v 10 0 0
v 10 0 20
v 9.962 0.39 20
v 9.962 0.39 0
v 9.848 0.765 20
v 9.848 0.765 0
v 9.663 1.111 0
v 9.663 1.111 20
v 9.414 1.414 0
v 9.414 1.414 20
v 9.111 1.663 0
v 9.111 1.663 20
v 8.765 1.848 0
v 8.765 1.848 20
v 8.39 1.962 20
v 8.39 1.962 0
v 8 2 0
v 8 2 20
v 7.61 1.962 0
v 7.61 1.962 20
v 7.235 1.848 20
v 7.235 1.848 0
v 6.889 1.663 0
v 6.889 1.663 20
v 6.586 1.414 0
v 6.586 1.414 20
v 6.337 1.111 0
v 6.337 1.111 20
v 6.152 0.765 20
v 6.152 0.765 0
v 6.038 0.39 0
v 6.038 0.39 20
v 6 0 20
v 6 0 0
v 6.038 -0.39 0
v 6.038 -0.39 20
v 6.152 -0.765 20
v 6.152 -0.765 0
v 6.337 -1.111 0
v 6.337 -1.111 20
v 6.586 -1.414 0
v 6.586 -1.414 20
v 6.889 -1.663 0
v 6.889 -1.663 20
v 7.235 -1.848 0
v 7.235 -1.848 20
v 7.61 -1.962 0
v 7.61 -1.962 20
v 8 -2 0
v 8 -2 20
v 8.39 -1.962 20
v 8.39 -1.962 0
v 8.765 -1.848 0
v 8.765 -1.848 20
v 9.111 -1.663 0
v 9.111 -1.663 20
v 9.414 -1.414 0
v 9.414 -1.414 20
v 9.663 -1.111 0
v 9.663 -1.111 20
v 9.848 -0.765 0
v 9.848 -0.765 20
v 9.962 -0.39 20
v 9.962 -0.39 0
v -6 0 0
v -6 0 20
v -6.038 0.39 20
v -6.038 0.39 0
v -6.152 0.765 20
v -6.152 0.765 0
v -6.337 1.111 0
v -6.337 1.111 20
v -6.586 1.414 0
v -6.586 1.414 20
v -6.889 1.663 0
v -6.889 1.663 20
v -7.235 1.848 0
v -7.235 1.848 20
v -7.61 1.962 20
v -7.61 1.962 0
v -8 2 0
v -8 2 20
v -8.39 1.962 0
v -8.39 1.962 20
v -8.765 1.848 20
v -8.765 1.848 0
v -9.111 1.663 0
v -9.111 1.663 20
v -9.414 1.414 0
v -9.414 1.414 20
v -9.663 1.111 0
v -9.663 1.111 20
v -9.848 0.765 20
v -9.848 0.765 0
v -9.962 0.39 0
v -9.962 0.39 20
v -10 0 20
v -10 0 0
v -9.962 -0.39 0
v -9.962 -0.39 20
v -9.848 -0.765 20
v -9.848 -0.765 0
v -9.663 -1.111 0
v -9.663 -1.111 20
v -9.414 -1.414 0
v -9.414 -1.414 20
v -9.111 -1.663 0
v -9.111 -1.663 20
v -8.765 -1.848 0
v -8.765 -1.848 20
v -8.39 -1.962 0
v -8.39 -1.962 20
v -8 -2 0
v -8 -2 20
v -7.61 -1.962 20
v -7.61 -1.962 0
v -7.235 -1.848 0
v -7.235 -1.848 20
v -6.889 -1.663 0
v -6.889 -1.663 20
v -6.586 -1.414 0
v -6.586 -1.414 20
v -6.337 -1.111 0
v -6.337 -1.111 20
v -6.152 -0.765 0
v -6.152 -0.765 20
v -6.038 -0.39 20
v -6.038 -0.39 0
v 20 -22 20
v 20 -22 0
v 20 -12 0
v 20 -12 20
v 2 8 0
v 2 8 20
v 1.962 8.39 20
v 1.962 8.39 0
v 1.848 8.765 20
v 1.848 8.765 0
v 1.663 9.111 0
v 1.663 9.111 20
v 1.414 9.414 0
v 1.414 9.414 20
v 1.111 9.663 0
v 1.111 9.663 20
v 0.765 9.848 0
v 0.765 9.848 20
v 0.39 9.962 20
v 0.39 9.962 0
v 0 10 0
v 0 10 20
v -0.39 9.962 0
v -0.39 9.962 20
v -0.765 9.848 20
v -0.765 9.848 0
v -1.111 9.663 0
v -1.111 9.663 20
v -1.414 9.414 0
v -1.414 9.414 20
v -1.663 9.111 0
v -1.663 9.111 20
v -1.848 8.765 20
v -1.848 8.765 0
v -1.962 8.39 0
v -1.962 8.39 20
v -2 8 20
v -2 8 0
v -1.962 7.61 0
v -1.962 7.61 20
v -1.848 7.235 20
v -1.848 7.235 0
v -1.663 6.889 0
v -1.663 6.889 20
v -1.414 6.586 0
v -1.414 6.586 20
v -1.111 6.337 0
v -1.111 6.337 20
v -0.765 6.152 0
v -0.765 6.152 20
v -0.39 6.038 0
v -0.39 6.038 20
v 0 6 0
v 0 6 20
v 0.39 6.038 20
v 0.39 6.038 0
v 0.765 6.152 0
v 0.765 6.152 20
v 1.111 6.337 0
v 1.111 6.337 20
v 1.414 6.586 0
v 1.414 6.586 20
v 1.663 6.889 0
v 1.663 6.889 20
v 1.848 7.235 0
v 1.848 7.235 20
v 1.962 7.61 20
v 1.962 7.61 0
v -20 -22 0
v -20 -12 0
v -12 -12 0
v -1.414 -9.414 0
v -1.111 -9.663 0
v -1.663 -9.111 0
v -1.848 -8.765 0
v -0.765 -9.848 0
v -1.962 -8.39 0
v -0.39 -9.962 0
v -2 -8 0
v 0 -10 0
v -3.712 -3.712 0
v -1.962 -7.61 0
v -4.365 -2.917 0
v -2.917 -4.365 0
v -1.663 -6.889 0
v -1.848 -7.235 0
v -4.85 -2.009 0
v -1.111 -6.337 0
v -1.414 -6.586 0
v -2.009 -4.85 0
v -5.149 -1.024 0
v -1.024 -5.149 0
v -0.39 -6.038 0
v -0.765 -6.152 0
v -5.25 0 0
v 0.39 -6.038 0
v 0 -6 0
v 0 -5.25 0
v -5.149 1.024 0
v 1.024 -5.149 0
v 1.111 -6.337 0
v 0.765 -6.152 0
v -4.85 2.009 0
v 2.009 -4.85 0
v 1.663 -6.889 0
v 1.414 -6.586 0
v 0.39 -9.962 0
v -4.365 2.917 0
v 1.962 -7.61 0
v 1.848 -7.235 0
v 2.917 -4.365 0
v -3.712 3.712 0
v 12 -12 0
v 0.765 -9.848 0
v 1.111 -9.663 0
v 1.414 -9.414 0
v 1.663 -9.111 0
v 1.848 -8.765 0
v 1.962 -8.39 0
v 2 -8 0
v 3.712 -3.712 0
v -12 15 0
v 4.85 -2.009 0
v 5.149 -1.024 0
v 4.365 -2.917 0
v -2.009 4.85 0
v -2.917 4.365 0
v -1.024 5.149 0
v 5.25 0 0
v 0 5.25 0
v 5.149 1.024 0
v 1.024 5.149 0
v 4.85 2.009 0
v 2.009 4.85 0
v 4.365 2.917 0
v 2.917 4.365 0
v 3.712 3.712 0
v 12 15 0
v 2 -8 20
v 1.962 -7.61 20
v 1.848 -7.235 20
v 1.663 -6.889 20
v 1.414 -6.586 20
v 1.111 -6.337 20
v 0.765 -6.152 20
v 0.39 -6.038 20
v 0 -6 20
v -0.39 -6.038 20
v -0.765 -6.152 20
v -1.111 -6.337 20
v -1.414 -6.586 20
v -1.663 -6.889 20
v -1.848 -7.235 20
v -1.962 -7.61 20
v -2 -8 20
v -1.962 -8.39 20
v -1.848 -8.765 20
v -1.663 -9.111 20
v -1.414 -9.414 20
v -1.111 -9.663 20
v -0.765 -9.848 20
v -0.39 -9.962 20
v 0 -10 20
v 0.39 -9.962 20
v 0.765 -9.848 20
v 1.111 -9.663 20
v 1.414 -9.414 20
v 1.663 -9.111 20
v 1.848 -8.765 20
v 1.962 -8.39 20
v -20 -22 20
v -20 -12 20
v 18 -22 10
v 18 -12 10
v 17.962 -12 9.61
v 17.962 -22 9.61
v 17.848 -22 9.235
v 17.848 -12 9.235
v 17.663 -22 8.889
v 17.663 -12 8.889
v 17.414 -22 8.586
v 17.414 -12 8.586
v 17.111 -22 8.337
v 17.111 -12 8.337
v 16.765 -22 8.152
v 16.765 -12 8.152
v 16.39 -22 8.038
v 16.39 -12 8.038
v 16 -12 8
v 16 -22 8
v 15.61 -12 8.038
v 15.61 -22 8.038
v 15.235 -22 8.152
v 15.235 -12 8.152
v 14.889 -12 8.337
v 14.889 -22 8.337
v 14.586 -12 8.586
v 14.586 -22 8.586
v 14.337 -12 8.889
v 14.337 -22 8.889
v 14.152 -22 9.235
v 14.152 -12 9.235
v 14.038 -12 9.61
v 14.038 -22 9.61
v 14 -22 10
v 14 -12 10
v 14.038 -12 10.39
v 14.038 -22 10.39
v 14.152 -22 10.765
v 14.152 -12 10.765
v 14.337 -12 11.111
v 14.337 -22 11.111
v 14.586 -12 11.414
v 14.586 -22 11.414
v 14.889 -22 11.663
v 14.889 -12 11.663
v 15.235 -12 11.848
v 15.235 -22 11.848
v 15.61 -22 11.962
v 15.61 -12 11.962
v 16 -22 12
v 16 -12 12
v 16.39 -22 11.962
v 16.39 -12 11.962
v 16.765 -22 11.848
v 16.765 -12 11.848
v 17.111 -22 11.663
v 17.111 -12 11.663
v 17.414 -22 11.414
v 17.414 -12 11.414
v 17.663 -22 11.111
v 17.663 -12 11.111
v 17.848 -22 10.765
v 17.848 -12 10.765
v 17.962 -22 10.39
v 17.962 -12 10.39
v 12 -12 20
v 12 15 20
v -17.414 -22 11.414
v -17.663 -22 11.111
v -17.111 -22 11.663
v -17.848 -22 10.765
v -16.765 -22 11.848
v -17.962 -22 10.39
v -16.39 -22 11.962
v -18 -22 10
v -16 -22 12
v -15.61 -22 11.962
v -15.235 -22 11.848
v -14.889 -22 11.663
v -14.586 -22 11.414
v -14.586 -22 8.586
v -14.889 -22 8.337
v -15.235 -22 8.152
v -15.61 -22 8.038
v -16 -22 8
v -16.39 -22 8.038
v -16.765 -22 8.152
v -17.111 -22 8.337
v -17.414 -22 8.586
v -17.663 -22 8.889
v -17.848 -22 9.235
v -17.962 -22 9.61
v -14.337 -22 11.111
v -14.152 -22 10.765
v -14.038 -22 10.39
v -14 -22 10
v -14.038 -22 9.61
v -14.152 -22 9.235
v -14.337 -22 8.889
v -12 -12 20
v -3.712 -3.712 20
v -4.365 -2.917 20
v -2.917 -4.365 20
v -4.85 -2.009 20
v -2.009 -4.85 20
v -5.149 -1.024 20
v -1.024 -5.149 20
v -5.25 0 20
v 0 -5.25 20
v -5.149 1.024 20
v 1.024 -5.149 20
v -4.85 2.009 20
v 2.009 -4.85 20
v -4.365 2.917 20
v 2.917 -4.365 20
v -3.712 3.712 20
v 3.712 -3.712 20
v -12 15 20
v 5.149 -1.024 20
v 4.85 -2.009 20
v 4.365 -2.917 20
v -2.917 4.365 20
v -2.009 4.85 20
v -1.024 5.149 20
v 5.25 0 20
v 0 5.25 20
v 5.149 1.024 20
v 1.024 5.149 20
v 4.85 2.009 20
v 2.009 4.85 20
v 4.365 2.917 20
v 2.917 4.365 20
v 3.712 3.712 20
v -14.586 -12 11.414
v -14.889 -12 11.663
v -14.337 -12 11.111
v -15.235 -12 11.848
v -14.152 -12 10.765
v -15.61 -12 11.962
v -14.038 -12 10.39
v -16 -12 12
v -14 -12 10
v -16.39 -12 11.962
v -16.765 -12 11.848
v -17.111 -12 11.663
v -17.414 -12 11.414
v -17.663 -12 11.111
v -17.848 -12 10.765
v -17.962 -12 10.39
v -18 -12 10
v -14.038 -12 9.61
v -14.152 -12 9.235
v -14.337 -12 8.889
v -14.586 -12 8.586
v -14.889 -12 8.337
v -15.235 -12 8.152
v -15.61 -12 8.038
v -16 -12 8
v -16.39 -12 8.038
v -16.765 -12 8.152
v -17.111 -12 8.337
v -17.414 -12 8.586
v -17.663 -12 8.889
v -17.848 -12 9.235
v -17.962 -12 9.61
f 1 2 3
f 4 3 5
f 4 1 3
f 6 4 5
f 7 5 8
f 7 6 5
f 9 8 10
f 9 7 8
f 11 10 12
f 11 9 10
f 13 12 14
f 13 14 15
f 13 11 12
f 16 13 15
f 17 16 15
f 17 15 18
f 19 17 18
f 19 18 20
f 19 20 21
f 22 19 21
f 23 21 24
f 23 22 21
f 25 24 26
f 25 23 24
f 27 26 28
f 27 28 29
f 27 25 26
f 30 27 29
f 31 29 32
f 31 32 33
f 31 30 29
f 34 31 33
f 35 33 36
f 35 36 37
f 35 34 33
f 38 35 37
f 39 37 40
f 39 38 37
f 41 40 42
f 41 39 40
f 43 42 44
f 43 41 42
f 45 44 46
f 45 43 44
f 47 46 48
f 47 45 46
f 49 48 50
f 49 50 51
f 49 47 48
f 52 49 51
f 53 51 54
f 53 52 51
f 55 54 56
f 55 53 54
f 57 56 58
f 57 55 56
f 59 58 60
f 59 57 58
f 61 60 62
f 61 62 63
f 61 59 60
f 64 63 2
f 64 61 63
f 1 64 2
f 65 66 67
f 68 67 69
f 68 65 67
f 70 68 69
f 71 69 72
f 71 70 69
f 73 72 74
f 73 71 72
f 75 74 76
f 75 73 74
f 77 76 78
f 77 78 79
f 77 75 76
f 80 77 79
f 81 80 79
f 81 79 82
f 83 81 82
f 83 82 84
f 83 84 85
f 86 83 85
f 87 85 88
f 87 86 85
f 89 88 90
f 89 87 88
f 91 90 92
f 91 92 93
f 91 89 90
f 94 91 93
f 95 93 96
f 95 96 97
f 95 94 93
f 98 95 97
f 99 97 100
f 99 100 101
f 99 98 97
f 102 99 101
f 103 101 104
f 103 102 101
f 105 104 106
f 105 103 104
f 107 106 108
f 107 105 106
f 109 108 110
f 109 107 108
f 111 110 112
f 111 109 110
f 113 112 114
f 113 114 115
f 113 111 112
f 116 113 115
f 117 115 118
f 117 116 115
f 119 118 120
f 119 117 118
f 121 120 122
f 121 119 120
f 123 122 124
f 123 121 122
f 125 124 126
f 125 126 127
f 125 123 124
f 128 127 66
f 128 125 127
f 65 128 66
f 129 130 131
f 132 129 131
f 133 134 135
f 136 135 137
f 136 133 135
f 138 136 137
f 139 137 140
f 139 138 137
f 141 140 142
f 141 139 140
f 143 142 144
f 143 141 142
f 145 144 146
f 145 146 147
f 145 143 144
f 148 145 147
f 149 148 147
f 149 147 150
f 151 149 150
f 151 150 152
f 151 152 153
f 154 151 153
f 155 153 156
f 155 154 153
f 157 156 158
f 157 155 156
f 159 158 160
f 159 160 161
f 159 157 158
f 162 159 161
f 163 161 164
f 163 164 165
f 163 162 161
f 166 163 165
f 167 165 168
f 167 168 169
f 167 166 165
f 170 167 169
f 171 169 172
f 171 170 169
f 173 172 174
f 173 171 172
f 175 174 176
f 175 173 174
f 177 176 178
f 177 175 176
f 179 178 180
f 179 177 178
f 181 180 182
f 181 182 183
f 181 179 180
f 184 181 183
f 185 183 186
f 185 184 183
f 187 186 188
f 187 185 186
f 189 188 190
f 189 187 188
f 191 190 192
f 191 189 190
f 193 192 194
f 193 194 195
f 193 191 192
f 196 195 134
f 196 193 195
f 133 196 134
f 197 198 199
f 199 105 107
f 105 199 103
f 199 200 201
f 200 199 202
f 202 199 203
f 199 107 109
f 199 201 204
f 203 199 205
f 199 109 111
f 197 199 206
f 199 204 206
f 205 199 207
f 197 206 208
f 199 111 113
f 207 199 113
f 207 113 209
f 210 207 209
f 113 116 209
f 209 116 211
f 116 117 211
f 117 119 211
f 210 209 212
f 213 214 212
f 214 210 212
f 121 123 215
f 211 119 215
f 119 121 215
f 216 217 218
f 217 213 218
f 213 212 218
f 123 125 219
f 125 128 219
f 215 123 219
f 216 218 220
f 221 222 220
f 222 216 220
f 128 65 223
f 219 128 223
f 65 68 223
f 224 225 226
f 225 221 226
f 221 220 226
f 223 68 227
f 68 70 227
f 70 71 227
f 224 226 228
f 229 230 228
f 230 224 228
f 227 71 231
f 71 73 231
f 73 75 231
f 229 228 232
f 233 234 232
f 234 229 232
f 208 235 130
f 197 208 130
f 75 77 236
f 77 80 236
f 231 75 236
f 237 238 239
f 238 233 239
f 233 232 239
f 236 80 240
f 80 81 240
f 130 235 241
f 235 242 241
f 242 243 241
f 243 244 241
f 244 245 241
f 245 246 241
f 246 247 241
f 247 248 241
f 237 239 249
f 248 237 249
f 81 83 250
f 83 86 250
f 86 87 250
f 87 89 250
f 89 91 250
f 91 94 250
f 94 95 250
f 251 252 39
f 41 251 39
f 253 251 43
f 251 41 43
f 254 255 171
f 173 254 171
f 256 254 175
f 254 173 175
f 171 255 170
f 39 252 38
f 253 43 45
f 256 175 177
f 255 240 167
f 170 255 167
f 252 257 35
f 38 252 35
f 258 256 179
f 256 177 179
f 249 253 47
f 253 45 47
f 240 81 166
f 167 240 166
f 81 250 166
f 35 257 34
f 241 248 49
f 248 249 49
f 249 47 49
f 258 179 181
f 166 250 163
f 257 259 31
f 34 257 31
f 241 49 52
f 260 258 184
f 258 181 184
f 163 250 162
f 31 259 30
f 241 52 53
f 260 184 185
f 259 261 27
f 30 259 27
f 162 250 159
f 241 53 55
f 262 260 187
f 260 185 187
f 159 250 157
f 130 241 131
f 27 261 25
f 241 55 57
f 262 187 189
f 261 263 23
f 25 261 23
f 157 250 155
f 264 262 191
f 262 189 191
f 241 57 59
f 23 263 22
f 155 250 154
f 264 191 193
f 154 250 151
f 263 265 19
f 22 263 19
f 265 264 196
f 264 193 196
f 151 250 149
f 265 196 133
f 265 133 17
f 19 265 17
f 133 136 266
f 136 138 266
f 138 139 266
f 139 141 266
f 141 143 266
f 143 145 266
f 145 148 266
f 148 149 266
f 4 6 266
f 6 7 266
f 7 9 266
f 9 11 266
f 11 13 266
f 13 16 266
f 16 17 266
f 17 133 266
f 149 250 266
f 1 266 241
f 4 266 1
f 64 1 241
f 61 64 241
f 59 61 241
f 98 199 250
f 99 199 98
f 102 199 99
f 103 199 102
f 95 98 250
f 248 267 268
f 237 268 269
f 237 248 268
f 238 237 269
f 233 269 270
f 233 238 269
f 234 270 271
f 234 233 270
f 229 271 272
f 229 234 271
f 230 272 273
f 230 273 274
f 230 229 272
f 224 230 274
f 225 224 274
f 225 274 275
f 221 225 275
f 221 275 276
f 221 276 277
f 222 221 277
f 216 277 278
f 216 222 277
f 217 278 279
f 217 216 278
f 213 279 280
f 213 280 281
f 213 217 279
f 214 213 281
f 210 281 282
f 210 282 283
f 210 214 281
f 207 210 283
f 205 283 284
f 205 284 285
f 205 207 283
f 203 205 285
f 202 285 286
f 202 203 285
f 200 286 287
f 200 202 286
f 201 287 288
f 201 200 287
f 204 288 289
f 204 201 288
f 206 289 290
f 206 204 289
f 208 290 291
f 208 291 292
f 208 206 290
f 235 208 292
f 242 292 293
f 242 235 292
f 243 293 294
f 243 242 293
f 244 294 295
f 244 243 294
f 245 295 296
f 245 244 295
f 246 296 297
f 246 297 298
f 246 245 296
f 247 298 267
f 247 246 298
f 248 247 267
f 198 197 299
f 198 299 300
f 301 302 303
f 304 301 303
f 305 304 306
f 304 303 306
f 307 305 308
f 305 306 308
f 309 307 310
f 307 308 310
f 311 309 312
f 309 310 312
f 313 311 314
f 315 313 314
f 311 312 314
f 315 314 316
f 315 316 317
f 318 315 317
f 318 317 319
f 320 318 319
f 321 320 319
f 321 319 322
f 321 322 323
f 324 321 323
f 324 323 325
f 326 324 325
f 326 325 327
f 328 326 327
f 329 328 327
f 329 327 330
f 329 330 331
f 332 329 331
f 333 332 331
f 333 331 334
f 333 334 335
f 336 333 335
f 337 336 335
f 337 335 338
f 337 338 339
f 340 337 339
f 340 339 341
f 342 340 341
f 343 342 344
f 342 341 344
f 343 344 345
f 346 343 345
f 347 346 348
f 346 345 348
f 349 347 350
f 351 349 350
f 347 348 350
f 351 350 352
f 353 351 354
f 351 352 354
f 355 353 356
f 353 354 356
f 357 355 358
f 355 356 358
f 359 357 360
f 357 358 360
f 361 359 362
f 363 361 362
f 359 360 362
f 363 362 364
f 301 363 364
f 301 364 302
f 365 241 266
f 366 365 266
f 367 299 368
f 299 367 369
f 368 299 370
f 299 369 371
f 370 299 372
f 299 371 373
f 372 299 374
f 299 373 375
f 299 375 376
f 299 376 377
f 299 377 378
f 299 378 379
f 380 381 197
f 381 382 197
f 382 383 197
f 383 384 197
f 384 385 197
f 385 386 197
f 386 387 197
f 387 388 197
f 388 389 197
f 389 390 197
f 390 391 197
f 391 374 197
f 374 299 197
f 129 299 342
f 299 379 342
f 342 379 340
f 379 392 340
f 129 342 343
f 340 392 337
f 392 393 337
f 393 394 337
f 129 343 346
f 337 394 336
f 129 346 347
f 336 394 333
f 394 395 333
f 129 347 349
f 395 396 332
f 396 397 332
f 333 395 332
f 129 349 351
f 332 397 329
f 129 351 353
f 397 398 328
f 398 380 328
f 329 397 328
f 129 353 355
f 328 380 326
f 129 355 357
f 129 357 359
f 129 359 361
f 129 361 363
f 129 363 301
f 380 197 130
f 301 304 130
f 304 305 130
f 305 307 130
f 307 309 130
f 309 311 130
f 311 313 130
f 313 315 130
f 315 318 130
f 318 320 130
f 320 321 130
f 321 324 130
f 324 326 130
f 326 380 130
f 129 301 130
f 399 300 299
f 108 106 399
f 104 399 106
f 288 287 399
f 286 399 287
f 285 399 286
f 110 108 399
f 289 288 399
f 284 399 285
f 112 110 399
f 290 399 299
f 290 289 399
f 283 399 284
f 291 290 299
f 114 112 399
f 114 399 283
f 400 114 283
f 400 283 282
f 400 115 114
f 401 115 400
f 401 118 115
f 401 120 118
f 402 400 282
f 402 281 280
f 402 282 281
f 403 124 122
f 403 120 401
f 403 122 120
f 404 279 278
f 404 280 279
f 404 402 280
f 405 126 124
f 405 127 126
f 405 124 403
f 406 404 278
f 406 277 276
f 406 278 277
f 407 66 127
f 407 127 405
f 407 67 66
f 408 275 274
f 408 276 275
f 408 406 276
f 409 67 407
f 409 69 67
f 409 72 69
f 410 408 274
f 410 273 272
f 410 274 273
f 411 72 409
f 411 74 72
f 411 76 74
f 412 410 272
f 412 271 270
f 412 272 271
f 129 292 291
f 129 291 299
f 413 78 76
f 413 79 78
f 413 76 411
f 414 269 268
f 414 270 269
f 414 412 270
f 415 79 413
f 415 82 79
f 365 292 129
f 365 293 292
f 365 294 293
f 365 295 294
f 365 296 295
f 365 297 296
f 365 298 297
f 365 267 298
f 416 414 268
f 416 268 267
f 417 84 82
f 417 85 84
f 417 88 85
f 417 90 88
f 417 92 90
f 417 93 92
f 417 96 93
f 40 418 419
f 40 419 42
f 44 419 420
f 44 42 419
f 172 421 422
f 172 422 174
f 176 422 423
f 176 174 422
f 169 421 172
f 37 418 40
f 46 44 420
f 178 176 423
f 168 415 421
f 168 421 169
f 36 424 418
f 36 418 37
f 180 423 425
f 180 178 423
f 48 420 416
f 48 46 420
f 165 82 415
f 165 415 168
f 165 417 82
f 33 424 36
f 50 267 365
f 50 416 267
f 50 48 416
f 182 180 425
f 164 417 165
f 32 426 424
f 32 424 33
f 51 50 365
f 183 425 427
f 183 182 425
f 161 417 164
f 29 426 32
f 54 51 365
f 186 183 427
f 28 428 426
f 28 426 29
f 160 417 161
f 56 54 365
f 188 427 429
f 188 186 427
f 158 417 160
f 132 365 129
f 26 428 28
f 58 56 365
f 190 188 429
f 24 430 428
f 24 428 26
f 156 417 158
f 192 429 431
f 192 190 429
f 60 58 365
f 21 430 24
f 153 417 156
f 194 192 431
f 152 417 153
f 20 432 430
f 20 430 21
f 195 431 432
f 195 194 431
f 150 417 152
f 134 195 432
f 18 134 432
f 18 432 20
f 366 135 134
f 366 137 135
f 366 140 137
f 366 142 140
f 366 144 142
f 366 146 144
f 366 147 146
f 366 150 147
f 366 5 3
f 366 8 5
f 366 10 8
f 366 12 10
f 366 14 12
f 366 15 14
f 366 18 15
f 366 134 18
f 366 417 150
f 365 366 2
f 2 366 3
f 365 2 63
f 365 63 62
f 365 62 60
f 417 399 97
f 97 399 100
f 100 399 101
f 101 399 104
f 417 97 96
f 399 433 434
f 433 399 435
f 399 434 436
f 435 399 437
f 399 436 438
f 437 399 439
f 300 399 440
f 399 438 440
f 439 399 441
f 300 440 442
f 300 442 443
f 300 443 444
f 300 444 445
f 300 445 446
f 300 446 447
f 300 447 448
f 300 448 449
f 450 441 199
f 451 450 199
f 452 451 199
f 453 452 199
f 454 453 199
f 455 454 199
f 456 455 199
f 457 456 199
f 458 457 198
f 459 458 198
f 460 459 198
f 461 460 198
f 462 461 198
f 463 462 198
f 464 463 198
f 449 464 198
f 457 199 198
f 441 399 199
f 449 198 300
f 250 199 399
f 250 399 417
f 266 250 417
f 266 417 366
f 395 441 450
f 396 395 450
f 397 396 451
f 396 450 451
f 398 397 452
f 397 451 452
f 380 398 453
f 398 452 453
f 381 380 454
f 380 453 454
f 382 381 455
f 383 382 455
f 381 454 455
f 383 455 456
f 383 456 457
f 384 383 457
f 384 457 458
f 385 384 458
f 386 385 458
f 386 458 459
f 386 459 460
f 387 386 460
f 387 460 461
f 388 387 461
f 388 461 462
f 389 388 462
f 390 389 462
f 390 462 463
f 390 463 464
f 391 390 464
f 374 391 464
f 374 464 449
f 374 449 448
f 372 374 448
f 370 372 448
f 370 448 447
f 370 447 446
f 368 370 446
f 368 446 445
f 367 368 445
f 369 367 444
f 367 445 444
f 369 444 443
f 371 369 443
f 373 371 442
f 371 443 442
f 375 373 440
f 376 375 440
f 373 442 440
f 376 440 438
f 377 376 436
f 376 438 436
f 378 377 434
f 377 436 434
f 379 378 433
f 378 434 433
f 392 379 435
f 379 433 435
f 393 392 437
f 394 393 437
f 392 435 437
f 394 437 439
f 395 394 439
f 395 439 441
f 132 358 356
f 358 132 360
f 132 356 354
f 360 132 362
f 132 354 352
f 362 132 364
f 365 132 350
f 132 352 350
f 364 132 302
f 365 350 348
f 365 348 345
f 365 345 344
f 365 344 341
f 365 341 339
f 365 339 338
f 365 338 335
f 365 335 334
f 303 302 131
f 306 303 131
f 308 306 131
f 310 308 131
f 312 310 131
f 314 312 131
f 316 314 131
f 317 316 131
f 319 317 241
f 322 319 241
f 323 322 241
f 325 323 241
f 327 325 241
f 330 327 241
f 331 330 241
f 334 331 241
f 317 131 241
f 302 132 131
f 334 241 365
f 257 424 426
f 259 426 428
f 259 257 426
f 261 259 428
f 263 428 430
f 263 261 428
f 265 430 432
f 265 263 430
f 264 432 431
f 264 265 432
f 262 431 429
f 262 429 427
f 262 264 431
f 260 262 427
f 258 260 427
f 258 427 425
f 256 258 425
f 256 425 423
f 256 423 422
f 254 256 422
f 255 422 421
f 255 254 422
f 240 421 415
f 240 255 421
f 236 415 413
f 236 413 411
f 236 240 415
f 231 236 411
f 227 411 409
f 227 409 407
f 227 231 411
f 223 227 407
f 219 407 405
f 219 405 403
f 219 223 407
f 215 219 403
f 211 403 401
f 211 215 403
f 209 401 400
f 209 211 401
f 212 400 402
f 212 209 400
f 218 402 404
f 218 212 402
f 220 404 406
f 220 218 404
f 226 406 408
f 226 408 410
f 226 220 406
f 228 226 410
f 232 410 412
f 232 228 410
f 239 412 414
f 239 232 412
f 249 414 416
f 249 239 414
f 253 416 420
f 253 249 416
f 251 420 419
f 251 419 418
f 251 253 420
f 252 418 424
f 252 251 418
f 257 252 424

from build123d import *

# Parameters (mm, degrees)
SKETCH1_W           = 40
SKETCH1_H           = 37
SKETCH1_R           = 5.25
SKETCH1_R_2         = 2
BOSS_EXTRUDE1_DEPTH = 20
SKETCH2_R           = 2
CUT_EXTRUDE1_DEPTH  = 38
SKETCH3_W           = 8
SKETCH3_H           = 27
CUT_EXTRUDE2_DEPTH  = 21


with BuildPart() as part:
    # Sketch1 → Boss-Extrude1 (new body)
    with BuildSketch(Plane.XY):
        with Locations((0, -3.5)):
            Rectangle(SKETCH1_W, SKETCH1_H)
        Circle(SKETCH1_R, mode=Mode.SUBTRACT)
        with Locations((0, 8)):
            Circle(SKETCH1_R_2, mode=Mode.SUBTRACT)
        with Locations((8, 0)):
            Circle(SKETCH1_R_2, mode=Mode.SUBTRACT)
        with Locations((0, -8)):
            Circle(SKETCH1_R_2, mode=Mode.SUBTRACT)
        with Locations((-8, 0)):
            Circle(SKETCH1_R_2, mode=Mode.SUBTRACT)
    extrude(amount=BOSS_EXTRUDE1_DEPTH)

    # Sketch2 → Cut-Extrude1 (cut, through all)
    with BuildSketch(Plane(origin=(0, 15, 0), x_dir=(1, 0, 0), z_dir=(0, 1, 0))):
        with Locations((-16, -10)):
            Circle(SKETCH2_R)
        with Locations((16, -10)):
            Circle(SKETCH2_R)
    extrude(amount=-CUT_EXTRUDE1_DEPTH, mode=Mode.SUBTRACT)

    # Sketch3 → Cut-Extrude2 (cut, through all)
    with BuildSketch(Plane(origin=(0, 0, 0), x_dir=(-1, 0, 0), z_dir=(0, 0, -1))):
        with Locations((16, 1.5)):
            Rectangle(SKETCH3_W, SKETCH3_H)
        with Locations((-16, 1.5)):
            Rectangle(SKETCH3_W, SKETCH3_H)
    extrude(amount=-CUT_EXTRUDE2_DEPTH, mode=Mode.SUBTRACT)


solid = part.part
